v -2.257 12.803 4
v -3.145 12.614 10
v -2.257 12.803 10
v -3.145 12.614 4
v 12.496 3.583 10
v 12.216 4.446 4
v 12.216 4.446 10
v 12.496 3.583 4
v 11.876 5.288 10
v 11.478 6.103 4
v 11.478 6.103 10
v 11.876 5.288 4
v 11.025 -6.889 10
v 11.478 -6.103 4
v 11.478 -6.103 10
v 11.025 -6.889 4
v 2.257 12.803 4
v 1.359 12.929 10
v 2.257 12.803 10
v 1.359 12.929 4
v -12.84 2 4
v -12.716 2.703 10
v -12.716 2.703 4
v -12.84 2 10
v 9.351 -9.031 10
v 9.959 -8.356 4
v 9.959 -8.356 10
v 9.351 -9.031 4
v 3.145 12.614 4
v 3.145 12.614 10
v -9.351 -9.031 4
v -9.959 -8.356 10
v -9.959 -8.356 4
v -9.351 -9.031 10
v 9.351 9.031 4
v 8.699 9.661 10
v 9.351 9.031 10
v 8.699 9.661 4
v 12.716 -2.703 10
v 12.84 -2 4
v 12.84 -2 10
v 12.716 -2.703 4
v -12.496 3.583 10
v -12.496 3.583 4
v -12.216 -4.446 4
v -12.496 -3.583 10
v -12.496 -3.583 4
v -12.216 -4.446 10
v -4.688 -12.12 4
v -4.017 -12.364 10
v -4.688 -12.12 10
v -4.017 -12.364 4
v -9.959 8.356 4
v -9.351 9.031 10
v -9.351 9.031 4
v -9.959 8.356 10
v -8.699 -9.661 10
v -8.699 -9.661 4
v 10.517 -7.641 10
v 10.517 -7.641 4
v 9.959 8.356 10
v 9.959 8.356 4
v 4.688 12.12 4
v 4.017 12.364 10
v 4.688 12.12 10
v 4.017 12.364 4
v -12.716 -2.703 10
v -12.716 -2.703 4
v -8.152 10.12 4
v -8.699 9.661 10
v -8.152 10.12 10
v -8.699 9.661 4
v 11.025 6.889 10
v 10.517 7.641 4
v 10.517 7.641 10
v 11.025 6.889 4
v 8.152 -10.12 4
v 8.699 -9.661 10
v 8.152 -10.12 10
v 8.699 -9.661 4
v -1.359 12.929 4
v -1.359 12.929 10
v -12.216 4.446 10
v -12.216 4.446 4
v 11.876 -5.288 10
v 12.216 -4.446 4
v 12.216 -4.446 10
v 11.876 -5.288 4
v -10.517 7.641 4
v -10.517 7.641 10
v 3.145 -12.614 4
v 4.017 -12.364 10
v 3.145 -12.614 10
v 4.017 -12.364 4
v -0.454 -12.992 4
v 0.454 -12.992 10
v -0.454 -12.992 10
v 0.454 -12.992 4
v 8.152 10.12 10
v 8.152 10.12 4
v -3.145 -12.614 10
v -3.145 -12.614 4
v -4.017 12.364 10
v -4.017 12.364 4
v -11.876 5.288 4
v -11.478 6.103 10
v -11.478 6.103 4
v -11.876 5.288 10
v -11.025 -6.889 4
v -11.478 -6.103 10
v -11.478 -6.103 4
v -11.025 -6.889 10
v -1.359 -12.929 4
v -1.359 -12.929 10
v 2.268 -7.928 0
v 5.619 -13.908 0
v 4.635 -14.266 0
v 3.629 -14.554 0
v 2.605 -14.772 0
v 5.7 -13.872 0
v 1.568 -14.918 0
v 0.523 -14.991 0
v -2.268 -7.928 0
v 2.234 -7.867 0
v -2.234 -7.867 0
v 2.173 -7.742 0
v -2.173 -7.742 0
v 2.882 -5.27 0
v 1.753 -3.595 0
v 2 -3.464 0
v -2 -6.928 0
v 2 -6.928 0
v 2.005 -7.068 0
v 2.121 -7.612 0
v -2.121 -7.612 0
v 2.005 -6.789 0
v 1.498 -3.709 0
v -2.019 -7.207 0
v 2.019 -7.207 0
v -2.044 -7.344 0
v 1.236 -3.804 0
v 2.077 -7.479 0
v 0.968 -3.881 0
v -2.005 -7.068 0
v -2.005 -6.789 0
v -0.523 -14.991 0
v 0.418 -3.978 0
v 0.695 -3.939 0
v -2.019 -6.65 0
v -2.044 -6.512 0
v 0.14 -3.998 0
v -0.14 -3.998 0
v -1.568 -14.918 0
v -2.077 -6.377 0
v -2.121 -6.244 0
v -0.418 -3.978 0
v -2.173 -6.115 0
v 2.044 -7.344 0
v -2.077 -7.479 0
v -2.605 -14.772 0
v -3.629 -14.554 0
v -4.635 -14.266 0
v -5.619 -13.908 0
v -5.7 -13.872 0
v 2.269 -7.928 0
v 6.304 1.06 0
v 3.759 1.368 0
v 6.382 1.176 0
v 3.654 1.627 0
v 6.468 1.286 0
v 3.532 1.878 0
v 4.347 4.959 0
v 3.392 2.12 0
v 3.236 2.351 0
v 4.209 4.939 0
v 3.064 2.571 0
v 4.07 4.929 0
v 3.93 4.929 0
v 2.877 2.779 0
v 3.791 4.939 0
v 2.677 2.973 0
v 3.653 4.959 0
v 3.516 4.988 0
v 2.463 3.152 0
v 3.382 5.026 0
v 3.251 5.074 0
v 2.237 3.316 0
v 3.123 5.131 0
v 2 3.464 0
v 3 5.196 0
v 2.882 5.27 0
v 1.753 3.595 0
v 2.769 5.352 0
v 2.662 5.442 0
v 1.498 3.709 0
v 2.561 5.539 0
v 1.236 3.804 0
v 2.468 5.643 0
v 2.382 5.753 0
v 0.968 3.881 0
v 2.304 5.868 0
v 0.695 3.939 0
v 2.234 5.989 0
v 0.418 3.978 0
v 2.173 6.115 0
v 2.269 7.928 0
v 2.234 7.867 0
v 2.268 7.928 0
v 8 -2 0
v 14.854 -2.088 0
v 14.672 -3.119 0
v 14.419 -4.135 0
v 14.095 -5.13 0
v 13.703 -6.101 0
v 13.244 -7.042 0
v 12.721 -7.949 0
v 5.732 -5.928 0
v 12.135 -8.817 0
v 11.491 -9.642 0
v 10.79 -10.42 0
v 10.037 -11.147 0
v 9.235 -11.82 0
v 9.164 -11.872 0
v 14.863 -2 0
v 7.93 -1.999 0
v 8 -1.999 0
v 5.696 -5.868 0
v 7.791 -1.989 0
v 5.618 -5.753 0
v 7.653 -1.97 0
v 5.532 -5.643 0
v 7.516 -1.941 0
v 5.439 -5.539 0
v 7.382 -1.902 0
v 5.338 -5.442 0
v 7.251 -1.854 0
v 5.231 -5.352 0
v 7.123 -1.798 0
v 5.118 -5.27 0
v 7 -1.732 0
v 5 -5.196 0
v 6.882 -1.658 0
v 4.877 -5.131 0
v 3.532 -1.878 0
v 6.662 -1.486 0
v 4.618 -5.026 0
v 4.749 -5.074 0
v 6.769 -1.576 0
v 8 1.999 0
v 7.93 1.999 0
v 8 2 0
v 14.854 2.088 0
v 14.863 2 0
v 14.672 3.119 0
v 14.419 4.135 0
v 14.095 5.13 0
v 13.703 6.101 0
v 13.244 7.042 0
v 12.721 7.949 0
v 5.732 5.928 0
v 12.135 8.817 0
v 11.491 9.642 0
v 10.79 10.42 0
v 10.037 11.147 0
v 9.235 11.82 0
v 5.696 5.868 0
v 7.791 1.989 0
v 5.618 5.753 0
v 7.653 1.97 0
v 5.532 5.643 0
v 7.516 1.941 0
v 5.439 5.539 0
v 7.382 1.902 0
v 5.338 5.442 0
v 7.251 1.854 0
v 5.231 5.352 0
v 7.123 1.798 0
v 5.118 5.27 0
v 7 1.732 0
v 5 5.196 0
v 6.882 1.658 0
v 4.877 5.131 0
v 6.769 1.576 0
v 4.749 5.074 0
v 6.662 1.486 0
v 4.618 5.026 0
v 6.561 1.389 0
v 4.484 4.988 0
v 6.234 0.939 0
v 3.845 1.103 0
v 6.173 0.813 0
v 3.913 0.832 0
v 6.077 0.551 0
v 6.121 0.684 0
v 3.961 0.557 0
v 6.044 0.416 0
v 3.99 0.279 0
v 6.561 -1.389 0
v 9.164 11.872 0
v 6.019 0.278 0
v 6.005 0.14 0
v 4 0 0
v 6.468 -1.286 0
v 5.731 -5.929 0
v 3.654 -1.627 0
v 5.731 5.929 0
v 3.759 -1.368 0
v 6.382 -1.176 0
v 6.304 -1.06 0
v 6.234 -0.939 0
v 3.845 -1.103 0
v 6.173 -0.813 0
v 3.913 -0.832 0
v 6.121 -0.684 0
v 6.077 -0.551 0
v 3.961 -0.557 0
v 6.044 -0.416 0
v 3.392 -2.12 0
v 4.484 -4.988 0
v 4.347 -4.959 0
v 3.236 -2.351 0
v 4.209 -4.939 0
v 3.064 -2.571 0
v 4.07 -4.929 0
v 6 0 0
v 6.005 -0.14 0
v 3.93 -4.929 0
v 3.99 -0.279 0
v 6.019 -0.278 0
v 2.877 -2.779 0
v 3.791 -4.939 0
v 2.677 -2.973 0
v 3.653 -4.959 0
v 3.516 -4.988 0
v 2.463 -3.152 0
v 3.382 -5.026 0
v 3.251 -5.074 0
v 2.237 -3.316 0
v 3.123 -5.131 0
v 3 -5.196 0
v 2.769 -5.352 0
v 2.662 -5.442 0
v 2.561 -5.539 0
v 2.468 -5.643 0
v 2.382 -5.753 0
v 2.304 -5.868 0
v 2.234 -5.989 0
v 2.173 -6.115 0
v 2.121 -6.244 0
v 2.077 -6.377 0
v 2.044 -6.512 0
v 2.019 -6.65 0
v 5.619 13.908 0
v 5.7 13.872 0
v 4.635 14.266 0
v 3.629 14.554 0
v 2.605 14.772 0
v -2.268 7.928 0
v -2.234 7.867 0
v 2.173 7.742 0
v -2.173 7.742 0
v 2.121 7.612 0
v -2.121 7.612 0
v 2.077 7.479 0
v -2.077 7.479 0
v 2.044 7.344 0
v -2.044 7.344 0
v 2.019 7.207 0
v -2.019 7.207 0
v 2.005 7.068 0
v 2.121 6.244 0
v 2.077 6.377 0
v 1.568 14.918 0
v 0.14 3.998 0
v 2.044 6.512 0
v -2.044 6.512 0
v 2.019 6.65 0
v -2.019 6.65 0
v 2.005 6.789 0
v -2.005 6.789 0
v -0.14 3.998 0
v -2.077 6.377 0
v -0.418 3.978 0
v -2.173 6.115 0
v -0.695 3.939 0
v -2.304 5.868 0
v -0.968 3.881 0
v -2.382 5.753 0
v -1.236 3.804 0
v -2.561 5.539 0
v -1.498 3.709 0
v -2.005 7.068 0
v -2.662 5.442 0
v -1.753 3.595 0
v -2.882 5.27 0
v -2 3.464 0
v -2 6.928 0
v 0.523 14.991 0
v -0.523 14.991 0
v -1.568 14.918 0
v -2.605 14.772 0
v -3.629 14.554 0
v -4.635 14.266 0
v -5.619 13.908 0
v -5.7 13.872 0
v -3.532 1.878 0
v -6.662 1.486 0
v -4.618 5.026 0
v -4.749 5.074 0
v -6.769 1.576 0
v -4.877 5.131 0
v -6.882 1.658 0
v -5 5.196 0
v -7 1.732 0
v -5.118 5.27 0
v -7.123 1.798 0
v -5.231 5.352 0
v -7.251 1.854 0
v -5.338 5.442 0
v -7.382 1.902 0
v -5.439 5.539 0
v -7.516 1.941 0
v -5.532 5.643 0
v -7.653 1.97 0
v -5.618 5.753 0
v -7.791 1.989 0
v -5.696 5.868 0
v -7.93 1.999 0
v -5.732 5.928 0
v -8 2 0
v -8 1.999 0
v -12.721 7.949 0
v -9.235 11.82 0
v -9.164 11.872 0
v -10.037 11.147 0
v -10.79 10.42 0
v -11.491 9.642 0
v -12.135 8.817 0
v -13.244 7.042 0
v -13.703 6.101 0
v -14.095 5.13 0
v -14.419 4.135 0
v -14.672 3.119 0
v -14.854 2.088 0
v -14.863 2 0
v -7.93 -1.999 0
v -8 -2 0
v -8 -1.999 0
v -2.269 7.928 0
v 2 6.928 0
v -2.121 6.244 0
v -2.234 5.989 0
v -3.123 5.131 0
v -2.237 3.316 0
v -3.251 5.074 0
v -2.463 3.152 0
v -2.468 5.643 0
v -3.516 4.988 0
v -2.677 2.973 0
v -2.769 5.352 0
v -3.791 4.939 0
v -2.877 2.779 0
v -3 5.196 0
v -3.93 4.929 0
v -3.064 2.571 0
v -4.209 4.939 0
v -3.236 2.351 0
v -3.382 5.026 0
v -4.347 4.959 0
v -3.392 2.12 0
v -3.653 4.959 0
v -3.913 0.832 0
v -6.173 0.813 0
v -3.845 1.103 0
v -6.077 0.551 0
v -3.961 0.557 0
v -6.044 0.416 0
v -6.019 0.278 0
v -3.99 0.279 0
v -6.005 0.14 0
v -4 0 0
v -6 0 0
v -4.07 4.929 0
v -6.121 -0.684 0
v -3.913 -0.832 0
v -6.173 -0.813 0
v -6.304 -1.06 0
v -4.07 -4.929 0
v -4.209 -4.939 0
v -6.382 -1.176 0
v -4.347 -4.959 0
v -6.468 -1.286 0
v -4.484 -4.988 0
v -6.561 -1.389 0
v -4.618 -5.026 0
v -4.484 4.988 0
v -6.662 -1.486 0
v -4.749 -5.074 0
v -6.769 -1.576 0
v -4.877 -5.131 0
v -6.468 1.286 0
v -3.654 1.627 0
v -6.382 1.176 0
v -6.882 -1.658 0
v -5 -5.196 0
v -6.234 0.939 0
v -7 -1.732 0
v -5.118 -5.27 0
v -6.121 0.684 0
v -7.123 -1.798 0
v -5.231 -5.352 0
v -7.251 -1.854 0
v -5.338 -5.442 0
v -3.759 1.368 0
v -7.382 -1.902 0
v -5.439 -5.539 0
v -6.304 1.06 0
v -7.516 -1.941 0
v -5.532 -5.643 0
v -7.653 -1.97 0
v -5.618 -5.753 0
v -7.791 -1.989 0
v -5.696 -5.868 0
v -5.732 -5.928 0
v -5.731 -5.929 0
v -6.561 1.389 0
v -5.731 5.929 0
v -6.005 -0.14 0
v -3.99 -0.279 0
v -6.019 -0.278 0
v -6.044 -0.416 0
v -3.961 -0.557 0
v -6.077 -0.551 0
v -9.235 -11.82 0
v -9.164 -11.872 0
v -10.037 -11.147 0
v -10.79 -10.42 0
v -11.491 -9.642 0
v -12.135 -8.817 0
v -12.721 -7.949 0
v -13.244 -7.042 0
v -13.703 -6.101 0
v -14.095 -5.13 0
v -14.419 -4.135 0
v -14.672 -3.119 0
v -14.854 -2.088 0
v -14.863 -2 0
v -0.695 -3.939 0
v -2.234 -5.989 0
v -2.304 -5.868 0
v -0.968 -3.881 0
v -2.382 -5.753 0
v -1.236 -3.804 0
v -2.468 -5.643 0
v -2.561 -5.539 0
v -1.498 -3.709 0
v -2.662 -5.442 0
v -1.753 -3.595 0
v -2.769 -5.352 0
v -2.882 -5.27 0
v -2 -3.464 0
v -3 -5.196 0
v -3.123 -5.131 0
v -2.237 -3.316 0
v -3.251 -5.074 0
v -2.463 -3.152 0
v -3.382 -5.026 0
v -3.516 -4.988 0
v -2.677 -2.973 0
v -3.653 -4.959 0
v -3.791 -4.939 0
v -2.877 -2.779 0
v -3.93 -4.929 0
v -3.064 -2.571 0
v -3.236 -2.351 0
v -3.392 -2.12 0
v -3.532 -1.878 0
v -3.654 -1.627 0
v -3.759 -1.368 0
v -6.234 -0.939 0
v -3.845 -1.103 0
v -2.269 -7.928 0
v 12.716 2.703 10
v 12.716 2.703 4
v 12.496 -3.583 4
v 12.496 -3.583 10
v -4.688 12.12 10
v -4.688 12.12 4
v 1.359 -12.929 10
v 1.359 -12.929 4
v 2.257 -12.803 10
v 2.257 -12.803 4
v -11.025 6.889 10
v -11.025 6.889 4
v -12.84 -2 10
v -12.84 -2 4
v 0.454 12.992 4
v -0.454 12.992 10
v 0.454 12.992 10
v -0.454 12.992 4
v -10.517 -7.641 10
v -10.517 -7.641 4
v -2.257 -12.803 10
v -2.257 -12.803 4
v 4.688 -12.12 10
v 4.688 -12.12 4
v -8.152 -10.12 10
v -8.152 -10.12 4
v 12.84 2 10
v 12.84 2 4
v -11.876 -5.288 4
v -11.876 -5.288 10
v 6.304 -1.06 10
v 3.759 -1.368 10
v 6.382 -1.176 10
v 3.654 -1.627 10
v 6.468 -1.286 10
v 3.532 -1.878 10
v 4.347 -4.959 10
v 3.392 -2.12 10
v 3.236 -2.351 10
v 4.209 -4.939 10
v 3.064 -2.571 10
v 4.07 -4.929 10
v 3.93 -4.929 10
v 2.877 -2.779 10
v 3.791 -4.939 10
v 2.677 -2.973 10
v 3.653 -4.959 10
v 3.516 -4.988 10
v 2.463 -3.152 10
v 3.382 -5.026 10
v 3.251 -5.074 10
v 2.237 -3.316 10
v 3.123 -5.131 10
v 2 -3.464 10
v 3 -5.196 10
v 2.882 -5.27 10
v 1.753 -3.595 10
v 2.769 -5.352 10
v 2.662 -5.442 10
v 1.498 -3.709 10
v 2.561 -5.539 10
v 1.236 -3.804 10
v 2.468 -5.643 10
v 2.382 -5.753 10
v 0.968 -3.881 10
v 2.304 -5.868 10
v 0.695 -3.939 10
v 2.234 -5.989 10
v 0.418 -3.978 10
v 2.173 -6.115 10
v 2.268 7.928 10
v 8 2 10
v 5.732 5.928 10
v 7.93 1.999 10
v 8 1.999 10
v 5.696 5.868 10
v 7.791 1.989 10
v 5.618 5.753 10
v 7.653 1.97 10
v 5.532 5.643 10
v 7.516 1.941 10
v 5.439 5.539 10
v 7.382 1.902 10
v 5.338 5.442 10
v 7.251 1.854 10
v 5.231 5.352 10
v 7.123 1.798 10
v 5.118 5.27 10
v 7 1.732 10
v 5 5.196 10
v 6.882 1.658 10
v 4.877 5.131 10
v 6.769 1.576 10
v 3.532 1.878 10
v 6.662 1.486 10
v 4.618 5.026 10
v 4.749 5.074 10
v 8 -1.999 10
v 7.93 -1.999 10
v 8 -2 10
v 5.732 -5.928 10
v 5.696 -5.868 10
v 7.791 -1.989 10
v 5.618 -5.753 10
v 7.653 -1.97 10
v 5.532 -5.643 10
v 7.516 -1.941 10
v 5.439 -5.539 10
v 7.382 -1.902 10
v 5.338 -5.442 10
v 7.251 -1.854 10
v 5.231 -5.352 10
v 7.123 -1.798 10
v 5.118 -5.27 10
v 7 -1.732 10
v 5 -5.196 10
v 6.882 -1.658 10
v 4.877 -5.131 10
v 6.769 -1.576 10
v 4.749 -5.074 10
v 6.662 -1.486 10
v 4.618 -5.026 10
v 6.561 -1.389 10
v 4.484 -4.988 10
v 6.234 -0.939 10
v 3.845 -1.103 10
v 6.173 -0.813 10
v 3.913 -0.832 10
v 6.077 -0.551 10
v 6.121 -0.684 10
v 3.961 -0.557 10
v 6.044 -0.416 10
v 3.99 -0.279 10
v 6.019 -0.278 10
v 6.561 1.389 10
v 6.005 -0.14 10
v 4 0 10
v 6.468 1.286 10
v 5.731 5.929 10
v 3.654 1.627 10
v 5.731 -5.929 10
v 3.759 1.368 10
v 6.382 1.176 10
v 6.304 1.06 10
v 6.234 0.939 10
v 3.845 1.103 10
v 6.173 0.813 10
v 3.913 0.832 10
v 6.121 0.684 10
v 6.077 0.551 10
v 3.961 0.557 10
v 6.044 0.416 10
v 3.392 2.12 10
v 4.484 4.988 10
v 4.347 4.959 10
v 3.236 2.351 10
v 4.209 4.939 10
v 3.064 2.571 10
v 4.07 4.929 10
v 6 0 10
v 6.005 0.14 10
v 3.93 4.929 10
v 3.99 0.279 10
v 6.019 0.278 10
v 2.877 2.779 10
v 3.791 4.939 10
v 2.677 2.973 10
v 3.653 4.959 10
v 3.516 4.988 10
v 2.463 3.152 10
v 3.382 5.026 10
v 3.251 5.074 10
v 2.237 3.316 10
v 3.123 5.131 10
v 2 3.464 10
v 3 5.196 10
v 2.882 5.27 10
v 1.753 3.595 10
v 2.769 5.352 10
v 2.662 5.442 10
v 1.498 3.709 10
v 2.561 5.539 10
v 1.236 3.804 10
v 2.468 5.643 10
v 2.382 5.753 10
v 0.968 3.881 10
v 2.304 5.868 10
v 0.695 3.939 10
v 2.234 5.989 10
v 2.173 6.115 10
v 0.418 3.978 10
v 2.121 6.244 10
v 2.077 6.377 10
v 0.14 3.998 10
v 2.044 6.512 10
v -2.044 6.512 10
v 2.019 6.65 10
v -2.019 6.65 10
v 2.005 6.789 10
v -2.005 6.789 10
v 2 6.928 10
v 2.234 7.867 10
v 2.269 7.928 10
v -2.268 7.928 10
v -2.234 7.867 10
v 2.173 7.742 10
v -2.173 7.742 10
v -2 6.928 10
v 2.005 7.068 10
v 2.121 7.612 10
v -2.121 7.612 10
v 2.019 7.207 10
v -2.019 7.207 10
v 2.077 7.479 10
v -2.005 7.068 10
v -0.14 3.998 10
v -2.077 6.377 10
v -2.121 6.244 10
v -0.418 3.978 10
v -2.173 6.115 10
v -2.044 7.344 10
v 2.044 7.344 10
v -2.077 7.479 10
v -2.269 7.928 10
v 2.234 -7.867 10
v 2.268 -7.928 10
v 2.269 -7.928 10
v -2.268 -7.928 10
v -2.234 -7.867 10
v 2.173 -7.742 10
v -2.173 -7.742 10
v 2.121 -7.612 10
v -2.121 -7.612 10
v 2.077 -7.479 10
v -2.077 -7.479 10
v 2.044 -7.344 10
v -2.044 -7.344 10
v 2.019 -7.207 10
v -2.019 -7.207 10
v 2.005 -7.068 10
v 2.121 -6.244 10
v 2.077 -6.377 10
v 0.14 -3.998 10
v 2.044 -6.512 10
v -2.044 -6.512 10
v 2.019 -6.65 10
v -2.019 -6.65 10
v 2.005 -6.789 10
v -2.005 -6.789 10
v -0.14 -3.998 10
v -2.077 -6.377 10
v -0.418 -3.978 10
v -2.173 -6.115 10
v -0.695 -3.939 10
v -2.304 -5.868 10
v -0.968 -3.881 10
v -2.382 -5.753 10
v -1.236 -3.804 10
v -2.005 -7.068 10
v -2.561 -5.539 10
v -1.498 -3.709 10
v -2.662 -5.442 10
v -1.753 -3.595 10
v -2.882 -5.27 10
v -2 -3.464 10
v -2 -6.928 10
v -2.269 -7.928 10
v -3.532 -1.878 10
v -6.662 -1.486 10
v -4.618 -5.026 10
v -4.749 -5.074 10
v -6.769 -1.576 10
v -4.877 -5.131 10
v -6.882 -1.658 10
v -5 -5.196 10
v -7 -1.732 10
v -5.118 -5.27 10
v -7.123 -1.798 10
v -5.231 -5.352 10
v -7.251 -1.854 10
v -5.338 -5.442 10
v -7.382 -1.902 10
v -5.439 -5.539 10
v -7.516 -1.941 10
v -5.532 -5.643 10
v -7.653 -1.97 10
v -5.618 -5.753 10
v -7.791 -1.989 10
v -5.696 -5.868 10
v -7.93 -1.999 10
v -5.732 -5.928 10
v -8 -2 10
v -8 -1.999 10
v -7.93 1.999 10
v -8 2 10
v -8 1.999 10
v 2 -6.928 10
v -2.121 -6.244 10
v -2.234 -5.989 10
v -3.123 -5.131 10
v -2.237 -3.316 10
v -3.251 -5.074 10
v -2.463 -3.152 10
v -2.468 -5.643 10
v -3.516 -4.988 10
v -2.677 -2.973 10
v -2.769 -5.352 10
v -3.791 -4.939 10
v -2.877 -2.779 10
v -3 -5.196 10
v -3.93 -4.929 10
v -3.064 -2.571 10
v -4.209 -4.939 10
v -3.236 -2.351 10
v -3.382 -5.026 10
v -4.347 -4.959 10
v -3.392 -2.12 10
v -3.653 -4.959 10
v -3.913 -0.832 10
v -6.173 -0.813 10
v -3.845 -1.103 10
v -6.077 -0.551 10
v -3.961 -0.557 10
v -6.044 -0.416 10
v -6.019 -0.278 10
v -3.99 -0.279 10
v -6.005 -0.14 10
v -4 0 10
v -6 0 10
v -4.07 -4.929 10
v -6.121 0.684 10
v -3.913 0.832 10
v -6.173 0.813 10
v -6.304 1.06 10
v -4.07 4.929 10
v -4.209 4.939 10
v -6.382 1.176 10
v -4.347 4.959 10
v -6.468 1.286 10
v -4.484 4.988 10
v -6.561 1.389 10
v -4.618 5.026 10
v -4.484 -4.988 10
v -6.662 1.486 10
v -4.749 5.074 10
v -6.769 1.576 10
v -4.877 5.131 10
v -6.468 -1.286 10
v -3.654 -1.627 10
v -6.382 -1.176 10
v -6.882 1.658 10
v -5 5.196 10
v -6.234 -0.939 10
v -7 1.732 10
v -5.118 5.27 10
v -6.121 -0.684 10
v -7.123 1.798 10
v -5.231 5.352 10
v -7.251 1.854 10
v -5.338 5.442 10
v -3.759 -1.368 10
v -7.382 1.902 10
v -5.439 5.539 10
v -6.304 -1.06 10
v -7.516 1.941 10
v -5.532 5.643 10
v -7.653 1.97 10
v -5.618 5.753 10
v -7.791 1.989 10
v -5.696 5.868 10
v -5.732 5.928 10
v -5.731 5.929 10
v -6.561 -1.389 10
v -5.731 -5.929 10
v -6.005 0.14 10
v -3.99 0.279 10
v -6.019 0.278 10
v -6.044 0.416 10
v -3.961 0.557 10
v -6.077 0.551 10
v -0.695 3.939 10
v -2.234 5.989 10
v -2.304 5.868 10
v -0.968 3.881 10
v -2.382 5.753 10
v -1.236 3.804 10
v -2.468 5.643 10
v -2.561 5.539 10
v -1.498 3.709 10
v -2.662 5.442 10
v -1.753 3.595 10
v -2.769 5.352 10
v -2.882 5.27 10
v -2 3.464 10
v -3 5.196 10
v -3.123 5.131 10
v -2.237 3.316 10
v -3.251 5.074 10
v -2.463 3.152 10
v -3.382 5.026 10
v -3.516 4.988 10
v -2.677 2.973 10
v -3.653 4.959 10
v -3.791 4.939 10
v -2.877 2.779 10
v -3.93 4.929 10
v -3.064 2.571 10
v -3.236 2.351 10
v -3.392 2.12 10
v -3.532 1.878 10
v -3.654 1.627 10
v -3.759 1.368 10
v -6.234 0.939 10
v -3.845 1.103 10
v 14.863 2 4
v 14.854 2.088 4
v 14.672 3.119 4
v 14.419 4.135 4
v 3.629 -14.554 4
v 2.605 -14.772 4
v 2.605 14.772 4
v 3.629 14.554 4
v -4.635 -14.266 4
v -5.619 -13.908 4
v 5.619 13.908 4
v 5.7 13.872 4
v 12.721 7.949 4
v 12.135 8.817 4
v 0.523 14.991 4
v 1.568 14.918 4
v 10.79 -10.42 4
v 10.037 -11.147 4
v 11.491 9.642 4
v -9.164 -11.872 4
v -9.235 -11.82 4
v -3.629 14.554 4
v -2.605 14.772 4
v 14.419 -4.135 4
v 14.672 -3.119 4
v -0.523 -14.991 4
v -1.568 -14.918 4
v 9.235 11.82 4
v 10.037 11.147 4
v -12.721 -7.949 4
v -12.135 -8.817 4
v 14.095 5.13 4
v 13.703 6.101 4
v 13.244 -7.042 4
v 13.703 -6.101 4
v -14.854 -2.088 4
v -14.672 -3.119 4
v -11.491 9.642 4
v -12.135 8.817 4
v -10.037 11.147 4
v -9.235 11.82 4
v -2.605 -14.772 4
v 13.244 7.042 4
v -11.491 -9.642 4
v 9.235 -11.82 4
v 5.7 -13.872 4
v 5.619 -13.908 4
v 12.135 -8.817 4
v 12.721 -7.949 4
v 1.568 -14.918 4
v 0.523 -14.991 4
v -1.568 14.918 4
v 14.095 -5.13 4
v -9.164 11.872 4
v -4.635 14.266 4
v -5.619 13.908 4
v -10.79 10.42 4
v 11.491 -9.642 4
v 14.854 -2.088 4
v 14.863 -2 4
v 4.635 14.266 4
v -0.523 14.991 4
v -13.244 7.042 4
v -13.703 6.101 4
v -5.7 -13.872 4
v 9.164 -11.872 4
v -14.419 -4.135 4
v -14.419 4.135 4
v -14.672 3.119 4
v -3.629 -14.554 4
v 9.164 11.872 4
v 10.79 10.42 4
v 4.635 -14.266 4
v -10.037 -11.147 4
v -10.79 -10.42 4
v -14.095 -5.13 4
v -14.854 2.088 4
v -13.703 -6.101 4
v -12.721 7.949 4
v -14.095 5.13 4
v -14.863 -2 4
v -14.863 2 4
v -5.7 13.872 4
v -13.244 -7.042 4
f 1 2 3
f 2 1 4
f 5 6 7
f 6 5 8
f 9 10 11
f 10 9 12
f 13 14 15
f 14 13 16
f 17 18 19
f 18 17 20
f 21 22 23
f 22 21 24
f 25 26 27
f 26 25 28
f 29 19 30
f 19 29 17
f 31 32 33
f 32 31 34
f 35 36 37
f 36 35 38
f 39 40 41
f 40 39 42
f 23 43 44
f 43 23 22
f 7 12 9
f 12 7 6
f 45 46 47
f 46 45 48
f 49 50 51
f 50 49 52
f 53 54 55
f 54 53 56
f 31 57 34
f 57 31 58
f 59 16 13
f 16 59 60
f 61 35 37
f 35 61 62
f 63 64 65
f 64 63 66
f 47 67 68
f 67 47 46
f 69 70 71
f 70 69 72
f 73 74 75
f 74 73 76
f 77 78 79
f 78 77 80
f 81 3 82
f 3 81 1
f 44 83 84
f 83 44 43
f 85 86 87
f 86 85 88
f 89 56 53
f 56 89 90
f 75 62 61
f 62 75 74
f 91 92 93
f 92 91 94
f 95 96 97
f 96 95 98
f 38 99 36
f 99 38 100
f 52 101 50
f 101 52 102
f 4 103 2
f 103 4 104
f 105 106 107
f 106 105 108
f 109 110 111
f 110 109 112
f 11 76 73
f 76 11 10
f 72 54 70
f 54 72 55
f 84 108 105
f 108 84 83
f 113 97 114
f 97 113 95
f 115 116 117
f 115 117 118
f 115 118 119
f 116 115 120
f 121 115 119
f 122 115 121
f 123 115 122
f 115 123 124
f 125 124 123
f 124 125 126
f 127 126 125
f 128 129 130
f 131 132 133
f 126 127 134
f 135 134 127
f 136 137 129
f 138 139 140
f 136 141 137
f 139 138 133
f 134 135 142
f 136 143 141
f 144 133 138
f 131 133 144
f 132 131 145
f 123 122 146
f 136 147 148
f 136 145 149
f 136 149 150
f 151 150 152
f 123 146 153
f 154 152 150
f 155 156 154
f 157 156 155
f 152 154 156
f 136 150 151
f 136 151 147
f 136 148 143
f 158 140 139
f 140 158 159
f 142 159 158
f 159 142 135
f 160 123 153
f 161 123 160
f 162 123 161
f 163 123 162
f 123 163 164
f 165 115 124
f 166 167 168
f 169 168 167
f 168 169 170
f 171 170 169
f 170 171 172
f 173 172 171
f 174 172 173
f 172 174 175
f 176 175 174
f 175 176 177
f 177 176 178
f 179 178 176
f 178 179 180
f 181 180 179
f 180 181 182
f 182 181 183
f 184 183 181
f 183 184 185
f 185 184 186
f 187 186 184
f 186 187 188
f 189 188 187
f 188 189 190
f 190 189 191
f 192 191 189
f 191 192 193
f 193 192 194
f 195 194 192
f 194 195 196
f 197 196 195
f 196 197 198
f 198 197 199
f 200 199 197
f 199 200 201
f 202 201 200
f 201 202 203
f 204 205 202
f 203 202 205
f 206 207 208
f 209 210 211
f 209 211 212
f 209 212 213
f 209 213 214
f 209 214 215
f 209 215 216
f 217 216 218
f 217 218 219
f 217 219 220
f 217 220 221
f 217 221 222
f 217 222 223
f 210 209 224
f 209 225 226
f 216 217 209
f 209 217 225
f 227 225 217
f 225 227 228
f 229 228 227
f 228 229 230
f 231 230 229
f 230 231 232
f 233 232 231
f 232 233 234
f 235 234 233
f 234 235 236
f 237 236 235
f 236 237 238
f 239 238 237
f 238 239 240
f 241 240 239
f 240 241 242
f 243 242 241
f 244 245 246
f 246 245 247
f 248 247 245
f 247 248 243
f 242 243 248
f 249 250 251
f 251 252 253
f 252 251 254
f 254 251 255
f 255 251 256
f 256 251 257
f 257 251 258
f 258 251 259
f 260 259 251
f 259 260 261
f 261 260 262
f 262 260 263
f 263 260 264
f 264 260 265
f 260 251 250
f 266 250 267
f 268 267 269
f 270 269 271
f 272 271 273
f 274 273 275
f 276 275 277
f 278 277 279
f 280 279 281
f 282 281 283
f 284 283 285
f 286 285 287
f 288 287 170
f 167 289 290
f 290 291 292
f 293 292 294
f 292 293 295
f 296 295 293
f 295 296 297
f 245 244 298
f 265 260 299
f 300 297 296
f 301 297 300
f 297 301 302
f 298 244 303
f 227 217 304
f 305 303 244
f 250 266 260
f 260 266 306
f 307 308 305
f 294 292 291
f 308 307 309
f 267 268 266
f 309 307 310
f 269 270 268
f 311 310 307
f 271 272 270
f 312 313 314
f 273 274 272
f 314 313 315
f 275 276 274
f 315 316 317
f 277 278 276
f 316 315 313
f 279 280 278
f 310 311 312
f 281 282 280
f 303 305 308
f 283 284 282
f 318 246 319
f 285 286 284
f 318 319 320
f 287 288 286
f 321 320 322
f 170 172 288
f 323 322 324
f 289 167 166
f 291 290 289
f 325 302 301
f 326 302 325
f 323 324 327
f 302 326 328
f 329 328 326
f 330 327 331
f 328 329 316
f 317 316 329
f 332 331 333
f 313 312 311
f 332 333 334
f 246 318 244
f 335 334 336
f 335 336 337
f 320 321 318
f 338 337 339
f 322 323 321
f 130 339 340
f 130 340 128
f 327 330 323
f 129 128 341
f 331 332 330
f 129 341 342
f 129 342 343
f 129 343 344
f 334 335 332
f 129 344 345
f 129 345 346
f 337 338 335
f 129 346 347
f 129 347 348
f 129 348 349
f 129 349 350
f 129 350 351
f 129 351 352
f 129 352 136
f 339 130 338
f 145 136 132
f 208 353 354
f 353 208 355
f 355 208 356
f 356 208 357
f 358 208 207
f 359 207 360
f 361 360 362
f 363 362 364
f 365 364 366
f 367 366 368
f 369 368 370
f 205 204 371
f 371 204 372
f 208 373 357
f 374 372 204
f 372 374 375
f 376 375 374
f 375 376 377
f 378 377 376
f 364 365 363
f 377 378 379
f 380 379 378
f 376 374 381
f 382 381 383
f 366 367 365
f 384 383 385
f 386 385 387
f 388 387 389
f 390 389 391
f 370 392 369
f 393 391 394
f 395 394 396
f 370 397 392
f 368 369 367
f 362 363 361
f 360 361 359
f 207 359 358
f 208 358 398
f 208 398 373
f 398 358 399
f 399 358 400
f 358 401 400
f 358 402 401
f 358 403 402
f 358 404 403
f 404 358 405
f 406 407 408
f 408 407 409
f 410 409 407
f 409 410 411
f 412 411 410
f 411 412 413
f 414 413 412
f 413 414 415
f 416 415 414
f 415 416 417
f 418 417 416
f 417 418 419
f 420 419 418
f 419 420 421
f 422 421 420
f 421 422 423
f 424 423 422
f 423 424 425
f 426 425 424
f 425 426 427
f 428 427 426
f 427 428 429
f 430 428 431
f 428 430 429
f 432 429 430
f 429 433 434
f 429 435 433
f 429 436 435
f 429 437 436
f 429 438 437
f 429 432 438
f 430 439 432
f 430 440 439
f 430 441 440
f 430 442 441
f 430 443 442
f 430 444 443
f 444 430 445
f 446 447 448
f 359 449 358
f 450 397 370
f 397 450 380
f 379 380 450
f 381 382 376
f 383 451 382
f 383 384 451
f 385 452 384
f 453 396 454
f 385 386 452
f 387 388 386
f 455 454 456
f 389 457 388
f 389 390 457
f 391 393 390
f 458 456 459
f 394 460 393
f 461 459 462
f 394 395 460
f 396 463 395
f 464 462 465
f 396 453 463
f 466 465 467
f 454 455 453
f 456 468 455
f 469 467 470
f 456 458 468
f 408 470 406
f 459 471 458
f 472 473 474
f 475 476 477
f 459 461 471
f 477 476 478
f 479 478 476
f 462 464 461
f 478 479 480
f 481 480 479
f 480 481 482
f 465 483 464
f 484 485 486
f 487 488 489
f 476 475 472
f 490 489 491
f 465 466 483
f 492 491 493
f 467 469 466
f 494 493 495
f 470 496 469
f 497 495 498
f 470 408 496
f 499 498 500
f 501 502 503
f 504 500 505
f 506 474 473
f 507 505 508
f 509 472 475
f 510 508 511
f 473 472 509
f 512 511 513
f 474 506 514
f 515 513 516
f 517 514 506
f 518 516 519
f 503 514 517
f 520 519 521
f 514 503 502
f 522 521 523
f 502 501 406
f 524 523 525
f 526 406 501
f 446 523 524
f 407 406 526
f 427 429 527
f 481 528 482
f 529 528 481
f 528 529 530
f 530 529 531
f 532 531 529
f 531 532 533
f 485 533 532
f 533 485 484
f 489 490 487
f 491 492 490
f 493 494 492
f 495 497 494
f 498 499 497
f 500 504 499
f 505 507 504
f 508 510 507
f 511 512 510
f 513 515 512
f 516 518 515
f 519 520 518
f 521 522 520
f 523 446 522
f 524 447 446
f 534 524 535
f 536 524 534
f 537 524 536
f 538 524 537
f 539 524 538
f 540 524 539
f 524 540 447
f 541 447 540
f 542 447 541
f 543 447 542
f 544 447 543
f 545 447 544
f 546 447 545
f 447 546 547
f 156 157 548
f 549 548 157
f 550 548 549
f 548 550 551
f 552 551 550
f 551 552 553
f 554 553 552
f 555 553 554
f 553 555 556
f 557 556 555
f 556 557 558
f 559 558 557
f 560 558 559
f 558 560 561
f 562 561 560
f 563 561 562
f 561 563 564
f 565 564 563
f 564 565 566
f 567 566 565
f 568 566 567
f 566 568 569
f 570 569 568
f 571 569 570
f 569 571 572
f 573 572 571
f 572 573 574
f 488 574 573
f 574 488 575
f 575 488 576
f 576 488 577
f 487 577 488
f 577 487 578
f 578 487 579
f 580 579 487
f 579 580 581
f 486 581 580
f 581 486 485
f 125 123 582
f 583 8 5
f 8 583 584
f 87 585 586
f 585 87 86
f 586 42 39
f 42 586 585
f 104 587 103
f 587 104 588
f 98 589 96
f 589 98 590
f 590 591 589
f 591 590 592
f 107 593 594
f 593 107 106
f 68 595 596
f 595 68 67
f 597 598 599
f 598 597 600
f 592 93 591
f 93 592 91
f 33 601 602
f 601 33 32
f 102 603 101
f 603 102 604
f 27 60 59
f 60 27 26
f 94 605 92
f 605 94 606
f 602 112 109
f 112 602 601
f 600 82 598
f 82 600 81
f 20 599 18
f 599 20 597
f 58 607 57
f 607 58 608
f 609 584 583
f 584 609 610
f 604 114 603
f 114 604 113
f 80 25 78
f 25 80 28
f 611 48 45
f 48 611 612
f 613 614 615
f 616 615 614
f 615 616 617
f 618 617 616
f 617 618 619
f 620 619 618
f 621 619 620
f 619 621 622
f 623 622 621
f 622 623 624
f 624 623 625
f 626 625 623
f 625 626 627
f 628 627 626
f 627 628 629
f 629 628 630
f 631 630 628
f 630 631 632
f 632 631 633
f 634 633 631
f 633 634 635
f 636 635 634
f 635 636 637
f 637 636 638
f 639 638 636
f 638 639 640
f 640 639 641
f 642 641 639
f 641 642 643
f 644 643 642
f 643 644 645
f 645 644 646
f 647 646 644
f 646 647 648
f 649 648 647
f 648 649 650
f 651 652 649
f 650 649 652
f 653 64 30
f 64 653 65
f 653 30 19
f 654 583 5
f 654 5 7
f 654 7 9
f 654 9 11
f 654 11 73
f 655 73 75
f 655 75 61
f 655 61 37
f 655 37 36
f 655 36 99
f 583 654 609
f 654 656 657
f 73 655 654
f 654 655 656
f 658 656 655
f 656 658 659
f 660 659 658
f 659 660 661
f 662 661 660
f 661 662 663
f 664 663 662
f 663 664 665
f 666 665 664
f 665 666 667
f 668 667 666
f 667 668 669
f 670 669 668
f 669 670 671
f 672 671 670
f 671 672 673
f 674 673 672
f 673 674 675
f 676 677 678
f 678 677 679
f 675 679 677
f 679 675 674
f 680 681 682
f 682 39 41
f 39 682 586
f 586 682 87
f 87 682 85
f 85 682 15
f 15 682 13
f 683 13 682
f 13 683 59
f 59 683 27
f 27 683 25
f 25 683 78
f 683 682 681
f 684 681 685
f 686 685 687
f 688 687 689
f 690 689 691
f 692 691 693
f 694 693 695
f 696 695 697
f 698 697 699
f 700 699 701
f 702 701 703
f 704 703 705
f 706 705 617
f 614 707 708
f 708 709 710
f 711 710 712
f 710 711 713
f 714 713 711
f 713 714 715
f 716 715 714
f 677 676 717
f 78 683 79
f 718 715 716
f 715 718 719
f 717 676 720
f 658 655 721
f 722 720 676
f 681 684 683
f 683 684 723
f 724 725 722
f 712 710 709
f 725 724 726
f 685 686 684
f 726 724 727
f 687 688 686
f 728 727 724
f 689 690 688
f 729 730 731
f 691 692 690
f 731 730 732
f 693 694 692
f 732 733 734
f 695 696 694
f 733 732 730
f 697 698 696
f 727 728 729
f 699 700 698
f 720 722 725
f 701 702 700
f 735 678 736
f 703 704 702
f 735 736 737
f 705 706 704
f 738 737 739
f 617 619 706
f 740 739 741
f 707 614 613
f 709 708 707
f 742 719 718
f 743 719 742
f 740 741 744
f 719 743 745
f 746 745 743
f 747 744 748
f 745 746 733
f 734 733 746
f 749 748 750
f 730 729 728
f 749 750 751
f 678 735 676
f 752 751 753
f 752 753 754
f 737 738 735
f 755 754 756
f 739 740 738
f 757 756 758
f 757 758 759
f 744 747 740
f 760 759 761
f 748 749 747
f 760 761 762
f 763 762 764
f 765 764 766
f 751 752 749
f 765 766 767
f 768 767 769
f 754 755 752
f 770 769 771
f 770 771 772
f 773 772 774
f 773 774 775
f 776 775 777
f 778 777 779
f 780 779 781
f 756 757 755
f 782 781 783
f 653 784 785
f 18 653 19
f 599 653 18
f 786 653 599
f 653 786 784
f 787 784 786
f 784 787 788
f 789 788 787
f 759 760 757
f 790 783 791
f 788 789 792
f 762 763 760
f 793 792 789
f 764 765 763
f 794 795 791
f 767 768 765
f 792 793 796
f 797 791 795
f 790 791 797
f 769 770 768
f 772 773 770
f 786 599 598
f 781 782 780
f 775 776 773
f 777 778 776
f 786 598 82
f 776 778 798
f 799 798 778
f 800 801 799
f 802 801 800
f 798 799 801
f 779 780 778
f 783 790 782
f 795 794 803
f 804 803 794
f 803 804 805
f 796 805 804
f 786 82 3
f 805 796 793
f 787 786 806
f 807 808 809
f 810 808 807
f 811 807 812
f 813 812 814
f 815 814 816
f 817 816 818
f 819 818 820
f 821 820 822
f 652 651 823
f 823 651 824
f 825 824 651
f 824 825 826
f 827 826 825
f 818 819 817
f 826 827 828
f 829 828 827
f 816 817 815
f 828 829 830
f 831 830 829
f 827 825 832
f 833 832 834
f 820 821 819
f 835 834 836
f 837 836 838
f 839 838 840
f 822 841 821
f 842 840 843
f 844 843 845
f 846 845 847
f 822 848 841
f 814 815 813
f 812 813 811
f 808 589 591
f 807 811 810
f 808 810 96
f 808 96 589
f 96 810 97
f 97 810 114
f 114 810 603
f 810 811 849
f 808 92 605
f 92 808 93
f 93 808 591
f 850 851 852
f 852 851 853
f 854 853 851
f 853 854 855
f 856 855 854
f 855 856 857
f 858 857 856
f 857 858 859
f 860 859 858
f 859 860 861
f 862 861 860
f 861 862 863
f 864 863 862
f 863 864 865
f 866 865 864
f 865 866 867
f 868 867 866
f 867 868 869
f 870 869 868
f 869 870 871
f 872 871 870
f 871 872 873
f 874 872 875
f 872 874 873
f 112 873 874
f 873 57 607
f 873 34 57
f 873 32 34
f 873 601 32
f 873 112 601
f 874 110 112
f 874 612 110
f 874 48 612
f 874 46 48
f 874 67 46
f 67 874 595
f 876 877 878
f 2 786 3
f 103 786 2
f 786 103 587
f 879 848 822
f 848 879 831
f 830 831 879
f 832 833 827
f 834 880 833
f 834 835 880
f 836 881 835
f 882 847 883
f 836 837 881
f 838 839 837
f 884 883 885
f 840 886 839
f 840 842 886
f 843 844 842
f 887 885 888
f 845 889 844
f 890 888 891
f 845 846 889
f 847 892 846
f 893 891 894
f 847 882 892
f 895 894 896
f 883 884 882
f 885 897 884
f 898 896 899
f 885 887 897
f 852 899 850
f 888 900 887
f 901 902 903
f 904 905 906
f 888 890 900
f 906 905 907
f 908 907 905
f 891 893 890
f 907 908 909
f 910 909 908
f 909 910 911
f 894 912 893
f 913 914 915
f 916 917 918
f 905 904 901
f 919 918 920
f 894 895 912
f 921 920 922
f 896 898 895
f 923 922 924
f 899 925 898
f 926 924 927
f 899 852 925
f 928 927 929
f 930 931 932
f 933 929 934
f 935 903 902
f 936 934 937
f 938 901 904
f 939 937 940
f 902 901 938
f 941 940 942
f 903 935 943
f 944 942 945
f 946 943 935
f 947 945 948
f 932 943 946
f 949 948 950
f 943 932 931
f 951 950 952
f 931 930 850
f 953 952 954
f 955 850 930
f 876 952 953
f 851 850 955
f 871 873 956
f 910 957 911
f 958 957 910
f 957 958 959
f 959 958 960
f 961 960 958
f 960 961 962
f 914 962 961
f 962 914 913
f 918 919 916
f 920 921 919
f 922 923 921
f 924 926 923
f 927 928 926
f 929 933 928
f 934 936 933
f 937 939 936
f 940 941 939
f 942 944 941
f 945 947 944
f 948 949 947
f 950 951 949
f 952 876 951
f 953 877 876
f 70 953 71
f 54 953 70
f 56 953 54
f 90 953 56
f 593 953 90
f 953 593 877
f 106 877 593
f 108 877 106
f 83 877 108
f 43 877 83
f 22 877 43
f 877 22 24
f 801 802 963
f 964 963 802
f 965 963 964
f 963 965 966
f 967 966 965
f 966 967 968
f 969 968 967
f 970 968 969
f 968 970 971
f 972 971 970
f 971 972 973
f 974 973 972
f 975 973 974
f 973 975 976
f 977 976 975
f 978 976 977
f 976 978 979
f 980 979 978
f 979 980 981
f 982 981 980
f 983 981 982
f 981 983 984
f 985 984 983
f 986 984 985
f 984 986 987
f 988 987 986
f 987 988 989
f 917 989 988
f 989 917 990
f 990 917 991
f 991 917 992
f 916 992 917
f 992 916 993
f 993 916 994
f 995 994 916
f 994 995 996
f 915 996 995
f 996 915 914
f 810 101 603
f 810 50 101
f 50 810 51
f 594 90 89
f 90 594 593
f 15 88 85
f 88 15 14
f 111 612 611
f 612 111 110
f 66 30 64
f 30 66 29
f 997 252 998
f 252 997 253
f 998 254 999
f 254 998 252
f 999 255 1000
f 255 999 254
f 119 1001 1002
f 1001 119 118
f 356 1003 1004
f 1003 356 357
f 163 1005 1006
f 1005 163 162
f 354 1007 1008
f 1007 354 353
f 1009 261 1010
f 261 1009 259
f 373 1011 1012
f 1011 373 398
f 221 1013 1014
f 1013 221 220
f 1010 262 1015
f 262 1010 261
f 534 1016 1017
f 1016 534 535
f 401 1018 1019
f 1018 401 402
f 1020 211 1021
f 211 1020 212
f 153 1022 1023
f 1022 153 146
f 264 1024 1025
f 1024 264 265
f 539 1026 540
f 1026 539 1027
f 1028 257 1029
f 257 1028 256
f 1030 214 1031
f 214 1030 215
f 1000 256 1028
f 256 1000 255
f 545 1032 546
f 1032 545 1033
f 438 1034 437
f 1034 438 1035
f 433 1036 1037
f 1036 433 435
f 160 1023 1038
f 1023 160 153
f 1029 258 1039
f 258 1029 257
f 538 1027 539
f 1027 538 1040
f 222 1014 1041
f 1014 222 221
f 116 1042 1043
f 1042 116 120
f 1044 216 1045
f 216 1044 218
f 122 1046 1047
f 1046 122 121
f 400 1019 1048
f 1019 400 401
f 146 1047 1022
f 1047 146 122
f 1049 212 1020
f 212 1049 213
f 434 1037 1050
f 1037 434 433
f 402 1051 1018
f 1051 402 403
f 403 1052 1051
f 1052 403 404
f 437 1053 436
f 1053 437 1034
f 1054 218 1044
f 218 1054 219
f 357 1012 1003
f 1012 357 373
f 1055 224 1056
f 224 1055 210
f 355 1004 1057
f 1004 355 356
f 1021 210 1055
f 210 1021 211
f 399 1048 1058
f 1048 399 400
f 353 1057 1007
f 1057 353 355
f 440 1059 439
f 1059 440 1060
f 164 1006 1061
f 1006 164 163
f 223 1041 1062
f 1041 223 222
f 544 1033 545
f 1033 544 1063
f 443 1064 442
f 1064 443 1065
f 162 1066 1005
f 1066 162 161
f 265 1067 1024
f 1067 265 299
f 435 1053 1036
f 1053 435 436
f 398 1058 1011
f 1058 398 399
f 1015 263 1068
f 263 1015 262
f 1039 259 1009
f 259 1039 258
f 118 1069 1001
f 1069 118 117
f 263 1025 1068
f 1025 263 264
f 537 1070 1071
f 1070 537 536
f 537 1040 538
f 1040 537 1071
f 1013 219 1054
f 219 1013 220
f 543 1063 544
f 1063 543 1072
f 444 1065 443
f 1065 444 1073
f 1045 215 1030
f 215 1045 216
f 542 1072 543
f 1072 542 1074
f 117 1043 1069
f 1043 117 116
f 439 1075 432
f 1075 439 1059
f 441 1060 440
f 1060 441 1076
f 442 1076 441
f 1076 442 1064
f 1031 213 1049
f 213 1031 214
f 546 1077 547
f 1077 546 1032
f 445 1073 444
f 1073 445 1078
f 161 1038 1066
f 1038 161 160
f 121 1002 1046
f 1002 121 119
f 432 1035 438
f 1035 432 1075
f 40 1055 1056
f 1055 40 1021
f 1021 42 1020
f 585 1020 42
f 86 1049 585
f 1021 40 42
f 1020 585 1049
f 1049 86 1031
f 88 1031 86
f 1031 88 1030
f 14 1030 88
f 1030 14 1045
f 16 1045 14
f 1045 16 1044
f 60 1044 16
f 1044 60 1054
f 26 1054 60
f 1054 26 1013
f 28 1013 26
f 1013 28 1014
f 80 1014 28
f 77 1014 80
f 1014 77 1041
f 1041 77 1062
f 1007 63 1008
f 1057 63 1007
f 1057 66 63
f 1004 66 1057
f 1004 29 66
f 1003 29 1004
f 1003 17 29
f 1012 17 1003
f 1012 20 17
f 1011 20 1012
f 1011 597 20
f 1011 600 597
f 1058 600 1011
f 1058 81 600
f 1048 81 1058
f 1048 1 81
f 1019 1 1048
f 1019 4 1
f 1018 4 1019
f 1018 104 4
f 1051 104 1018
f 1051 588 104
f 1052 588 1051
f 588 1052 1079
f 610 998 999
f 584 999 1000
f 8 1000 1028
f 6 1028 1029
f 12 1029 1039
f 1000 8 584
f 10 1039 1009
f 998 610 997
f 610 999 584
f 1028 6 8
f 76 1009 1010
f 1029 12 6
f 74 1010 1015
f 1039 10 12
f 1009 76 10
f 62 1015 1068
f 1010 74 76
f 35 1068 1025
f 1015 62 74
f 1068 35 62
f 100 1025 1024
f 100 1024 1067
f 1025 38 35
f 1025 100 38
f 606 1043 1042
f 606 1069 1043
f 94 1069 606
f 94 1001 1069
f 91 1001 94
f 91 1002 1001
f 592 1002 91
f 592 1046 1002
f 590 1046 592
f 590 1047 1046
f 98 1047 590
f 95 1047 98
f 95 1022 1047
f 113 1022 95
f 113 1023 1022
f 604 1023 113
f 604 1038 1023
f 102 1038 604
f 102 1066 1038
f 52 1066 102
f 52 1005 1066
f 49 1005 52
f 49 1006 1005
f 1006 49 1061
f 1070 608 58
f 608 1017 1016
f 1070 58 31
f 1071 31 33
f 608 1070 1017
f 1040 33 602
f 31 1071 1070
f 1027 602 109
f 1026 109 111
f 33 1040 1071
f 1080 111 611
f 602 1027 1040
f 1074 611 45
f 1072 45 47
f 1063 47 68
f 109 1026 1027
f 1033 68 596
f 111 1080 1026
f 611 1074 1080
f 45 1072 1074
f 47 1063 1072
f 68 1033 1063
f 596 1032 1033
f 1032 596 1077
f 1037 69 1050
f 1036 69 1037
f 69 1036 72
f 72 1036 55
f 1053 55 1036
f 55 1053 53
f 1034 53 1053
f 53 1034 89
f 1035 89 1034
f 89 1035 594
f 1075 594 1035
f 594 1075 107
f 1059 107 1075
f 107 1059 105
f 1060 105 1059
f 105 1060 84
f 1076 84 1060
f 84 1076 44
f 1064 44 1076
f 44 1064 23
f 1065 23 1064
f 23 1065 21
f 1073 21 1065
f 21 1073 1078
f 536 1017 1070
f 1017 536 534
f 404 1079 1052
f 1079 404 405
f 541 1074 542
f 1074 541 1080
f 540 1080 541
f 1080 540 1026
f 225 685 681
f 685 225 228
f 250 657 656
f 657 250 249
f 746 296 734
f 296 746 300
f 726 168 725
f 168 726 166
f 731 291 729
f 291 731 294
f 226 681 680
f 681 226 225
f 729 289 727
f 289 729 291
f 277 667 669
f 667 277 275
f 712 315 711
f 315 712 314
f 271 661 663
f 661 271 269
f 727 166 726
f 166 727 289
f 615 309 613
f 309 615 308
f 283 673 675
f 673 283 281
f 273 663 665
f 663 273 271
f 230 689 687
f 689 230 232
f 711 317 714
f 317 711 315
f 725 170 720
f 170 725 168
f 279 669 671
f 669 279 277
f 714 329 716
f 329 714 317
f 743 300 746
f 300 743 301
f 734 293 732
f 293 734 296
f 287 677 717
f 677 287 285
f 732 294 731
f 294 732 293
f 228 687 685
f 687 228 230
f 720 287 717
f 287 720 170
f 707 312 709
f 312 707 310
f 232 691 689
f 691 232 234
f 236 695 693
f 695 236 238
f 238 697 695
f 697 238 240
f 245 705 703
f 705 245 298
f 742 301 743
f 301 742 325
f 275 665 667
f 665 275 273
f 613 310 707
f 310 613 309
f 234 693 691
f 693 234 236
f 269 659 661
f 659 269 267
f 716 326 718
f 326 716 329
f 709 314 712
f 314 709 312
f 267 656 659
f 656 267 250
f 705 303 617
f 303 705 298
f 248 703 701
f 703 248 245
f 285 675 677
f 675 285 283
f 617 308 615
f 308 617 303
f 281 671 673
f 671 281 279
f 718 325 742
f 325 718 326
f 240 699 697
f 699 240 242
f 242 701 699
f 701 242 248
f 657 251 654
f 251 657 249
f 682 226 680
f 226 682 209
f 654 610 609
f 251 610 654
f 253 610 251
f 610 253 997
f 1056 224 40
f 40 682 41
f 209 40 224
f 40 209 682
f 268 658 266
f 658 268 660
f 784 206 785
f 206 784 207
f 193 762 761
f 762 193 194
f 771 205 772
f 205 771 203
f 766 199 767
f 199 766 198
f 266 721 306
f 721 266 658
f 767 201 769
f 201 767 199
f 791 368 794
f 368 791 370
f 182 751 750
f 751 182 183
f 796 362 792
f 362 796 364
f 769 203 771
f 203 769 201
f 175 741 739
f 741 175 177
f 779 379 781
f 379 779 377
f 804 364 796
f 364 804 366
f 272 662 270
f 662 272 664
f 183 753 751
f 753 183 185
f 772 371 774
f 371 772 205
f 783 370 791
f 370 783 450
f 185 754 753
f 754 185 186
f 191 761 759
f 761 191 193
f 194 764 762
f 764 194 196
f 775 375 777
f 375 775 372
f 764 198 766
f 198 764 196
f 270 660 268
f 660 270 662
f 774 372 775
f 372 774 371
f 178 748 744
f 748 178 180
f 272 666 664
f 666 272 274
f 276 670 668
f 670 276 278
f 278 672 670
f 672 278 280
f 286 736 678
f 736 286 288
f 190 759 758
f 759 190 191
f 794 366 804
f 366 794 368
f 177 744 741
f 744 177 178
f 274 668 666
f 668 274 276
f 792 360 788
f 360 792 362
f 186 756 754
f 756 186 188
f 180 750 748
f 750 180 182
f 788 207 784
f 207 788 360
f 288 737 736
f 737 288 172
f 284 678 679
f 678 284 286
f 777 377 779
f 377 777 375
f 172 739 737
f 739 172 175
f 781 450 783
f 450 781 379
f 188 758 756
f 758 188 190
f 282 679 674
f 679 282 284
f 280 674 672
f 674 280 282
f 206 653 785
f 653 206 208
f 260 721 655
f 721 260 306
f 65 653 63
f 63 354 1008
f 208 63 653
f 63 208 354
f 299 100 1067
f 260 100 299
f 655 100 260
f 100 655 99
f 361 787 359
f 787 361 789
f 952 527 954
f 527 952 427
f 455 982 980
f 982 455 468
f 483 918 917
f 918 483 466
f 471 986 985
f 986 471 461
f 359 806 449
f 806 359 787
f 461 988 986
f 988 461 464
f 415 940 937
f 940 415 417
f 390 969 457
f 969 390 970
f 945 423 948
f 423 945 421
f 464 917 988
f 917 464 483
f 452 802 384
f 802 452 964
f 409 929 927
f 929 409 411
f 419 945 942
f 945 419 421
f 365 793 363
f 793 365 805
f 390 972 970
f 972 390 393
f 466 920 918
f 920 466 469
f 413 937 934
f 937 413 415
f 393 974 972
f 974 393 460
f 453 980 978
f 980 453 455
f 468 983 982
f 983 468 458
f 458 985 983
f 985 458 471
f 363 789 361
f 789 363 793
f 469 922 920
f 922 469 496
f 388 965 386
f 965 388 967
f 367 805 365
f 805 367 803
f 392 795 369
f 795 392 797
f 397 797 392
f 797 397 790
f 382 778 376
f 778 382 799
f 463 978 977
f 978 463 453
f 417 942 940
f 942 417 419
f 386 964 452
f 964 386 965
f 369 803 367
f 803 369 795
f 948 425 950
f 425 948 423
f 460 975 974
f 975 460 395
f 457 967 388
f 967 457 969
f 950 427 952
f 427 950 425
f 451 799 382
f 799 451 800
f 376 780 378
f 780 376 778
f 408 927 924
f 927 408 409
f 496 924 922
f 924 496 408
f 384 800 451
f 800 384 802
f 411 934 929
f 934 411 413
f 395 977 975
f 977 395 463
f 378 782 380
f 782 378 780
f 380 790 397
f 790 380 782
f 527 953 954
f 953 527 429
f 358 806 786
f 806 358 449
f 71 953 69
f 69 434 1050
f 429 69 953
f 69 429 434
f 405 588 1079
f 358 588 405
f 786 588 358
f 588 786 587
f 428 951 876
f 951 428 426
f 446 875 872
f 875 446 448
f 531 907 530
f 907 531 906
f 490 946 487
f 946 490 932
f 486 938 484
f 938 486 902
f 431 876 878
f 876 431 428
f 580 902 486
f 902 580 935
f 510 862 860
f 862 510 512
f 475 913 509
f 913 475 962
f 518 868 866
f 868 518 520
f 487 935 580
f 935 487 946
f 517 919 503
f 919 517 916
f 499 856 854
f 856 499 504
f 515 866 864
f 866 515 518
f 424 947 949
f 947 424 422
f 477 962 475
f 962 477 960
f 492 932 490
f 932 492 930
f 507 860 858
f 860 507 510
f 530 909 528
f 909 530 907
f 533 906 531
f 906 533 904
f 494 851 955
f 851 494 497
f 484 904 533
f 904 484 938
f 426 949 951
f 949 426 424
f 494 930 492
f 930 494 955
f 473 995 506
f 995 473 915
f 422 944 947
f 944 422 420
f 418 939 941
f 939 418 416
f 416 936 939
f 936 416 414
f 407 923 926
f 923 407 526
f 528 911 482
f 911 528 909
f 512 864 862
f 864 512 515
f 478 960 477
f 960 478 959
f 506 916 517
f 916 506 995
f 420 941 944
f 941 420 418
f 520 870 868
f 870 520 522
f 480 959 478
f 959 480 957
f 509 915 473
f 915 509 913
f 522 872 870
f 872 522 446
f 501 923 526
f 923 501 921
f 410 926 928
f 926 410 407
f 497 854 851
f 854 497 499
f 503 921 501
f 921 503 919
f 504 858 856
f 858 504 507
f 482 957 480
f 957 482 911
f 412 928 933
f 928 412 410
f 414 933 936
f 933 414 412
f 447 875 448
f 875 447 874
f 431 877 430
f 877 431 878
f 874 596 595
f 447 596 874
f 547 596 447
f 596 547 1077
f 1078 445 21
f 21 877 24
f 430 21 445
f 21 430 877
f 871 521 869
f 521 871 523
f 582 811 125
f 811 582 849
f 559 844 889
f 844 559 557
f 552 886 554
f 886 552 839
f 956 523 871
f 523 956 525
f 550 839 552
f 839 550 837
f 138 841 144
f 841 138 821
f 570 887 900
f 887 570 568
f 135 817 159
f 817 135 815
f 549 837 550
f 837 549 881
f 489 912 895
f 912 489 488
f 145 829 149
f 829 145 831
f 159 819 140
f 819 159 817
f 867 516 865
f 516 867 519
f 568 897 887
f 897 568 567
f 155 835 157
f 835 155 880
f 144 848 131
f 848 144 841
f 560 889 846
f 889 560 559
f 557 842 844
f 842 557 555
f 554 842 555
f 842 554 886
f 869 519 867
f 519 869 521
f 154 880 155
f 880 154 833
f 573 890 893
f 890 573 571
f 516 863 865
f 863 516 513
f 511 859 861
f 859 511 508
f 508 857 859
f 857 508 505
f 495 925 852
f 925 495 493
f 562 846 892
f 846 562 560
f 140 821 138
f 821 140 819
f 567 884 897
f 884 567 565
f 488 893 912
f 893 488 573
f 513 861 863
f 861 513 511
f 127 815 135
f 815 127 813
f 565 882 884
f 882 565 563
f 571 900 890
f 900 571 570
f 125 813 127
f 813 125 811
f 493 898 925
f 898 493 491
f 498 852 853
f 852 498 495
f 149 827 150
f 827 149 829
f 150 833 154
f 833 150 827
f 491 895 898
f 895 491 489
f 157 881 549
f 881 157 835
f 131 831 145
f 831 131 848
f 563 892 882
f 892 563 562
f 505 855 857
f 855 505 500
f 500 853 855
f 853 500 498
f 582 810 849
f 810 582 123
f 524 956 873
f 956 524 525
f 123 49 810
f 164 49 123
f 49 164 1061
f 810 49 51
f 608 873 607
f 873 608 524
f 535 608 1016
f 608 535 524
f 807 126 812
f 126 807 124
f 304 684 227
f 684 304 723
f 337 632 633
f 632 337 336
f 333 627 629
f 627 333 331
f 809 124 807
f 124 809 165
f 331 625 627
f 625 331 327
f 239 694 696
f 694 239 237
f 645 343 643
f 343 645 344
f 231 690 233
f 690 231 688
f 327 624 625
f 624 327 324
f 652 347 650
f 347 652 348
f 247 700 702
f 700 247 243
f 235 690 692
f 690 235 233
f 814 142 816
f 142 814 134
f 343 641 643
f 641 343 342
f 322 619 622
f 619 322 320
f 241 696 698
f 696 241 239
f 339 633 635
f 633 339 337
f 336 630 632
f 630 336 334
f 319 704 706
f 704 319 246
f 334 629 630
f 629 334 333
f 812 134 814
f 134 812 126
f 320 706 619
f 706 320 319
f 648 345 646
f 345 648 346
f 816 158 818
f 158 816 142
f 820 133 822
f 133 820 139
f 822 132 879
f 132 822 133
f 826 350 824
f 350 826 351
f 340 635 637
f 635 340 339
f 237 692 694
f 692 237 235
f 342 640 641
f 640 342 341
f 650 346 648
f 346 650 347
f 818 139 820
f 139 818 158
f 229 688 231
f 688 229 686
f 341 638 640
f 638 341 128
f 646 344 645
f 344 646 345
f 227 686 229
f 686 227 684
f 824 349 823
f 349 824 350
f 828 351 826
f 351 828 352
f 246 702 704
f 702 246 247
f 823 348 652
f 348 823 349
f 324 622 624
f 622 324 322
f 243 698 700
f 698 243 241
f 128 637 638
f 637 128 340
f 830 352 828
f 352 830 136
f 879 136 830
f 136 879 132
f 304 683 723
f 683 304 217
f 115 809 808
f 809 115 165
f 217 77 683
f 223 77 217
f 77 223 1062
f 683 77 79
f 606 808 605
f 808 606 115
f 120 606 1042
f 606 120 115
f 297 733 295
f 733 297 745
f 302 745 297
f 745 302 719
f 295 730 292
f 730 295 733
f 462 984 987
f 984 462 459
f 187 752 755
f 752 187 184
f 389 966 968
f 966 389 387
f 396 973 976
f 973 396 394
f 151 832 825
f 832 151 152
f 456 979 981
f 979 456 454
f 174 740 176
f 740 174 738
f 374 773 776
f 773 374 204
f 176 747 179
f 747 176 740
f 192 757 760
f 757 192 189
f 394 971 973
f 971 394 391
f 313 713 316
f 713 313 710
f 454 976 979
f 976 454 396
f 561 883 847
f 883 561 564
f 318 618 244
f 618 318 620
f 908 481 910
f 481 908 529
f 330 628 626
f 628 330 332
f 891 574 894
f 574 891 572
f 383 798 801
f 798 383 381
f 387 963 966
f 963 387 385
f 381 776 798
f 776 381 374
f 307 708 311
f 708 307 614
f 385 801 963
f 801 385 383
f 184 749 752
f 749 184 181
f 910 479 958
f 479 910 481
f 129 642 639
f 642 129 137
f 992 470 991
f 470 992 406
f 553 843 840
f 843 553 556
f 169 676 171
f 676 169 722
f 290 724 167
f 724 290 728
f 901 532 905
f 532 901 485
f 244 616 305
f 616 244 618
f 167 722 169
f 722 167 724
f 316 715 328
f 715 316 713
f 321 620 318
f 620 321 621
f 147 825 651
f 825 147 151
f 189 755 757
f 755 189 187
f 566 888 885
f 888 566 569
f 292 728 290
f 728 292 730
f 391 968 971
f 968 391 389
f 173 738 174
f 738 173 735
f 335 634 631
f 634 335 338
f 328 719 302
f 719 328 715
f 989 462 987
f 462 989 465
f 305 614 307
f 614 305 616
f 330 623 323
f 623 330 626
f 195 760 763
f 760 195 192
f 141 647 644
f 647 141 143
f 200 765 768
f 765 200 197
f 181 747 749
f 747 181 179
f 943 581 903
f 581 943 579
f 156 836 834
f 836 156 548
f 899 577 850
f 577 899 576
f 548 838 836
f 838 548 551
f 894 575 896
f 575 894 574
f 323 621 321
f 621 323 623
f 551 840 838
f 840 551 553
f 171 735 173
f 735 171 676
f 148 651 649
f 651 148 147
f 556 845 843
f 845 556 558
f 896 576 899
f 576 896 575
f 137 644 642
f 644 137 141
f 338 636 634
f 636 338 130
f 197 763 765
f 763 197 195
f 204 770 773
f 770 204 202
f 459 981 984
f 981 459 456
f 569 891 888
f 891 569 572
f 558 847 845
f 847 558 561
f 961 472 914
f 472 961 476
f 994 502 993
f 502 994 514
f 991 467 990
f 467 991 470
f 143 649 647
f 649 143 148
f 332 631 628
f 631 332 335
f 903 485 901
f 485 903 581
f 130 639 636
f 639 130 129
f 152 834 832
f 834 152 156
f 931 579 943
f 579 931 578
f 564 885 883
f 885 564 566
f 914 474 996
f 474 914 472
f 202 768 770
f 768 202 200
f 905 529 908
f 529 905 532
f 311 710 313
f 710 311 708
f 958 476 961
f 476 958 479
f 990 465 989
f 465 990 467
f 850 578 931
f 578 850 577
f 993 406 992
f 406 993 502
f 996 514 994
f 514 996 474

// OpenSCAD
$fn = 90;

H = 10;
D = 26;

difference() {
    union() {
        cylinder(h=H, d=D);	
        cylinder(h=4, d=D+4);
    }
	cylinder(h=H, d=8);
	for(r=[0:5]) {
		rotate([0, 0, 60*r]) {
			//translate([D/2, 0, 0,]) cylinder(h=H, d=8);
            translate([8, 0, 0]) cylinder(h=H, d=4);
            translate([8, -2, 0]) cube(size=[10, 4, H]);
                
		}
	}
}
